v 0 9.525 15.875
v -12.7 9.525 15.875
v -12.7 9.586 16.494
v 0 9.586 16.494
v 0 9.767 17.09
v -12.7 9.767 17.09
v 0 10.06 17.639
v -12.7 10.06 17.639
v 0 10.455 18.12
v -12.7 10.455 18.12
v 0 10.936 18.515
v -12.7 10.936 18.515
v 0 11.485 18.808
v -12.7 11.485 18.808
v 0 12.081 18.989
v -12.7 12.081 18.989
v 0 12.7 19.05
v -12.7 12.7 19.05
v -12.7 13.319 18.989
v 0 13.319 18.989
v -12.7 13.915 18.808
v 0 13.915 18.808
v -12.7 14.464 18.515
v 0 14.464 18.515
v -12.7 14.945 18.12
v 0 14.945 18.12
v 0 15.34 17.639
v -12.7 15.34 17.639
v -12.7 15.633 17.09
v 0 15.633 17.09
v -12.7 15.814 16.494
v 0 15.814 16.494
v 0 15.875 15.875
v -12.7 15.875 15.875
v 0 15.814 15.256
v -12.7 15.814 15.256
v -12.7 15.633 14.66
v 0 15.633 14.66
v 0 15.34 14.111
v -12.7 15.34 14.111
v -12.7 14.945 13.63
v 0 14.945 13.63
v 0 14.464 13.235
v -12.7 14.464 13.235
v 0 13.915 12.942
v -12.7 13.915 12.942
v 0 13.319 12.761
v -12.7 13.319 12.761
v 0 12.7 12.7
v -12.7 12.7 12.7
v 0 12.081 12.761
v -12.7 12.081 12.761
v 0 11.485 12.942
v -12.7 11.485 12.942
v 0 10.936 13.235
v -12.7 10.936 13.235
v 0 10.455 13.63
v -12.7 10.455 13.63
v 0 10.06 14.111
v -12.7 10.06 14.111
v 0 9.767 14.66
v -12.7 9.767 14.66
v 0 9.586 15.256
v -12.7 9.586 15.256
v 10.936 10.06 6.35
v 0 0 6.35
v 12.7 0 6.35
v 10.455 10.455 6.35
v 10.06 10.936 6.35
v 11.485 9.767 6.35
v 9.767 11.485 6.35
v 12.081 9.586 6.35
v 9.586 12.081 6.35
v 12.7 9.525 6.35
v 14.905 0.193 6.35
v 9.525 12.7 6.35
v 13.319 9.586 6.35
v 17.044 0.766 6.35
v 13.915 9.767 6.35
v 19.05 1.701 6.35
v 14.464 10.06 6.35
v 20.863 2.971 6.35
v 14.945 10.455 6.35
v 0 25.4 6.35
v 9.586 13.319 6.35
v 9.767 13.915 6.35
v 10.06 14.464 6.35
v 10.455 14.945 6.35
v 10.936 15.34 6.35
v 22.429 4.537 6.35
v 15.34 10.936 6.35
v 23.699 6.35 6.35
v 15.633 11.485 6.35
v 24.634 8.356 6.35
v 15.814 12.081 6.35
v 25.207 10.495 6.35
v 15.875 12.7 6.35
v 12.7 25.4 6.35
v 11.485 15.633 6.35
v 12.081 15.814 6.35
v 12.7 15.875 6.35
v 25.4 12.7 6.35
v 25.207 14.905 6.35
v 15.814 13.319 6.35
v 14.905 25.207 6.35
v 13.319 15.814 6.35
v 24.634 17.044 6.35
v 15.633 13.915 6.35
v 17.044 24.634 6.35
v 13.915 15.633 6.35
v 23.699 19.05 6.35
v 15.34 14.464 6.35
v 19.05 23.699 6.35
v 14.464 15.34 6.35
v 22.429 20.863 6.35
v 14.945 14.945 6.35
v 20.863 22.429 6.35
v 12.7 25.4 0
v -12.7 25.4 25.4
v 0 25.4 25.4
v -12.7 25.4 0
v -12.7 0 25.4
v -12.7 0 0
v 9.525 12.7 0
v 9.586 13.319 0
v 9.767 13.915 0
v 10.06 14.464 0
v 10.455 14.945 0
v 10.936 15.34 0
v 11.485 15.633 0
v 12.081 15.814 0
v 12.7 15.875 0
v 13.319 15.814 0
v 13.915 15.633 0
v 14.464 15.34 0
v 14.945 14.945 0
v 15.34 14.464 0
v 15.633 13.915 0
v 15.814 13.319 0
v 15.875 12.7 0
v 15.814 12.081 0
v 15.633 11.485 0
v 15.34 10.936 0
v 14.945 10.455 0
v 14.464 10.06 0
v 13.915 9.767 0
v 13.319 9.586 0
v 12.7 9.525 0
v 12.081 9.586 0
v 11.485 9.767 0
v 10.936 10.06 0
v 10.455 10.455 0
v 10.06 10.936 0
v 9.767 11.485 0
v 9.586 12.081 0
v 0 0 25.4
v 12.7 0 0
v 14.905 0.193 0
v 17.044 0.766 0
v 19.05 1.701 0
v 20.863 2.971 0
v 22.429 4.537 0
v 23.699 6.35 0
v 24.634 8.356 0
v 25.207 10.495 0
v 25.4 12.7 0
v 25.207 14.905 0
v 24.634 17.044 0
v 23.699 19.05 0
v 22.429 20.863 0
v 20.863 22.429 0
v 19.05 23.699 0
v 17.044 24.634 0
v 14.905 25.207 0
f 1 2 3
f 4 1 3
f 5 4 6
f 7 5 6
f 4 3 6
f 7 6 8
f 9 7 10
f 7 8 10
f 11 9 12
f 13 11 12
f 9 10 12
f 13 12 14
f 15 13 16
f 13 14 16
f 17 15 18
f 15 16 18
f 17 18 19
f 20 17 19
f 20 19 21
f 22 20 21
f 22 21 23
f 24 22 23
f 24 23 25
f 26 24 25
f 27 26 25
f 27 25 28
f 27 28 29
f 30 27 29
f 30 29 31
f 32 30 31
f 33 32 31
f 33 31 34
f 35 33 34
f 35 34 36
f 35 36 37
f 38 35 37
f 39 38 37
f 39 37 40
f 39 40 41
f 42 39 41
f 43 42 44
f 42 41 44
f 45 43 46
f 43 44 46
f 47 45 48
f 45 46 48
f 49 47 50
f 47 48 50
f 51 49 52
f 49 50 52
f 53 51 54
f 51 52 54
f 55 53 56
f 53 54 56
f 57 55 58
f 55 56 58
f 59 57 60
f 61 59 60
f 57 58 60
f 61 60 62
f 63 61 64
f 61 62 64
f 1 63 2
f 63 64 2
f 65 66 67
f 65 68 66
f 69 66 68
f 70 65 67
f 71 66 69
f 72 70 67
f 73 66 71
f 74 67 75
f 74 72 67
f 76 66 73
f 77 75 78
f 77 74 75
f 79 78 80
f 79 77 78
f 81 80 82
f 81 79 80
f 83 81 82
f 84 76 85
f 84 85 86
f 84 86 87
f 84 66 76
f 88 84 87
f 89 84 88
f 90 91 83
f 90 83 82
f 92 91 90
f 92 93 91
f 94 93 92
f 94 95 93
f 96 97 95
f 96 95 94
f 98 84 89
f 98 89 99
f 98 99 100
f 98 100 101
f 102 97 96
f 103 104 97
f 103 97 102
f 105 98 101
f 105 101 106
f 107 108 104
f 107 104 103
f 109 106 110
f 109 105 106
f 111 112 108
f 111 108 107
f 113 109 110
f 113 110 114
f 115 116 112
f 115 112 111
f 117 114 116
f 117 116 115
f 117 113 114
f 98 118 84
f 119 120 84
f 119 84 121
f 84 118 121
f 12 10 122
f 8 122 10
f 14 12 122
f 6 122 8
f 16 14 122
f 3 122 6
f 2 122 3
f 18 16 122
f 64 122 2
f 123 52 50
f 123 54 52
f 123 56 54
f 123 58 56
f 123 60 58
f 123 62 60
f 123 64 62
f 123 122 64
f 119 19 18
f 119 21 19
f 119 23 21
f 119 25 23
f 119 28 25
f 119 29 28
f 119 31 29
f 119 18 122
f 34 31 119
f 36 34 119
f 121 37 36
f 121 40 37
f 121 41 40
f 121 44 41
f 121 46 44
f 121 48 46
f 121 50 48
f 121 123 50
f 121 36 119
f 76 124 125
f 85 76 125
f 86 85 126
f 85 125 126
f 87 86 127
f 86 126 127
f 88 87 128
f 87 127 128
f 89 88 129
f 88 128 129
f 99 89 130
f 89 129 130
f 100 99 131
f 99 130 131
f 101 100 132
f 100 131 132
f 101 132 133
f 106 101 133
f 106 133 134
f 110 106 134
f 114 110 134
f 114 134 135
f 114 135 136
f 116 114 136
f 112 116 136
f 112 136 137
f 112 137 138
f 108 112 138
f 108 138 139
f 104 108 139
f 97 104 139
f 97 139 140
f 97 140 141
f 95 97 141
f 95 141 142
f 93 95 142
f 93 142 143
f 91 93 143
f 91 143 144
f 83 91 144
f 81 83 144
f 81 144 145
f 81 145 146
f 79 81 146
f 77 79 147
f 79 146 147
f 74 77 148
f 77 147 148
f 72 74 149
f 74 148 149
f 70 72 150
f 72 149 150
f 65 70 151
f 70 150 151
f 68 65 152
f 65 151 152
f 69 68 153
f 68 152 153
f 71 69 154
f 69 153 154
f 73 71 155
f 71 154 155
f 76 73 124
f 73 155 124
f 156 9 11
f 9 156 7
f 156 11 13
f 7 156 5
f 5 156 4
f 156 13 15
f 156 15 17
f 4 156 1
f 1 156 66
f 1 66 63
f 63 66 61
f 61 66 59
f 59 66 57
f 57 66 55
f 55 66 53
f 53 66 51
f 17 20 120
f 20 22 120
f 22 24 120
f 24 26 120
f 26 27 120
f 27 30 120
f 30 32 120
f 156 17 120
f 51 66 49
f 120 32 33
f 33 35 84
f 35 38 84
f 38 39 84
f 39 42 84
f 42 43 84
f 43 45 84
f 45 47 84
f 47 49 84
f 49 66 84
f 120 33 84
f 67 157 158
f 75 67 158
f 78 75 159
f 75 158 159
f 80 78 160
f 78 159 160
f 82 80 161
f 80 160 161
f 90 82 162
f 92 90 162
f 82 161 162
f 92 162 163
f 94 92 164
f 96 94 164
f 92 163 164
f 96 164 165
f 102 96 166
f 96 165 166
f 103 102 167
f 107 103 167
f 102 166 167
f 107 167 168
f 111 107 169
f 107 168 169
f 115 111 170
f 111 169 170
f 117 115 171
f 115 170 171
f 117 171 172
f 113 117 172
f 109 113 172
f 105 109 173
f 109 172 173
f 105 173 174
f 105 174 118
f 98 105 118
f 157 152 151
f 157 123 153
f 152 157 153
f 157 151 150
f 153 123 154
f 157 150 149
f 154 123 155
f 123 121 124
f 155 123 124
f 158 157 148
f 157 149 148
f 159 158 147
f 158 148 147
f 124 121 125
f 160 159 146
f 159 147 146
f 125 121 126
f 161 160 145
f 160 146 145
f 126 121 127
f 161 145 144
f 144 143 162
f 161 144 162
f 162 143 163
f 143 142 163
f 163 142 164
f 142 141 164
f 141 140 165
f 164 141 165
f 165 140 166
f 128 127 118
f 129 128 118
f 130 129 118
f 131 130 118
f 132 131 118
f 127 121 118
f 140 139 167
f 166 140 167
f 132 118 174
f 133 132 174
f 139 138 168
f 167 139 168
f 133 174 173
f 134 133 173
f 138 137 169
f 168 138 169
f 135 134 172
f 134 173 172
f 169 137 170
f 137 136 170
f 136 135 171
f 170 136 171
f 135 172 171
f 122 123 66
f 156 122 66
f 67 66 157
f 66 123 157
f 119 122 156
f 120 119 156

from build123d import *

# Parameters (mm, degrees)
F0_W     = 12.7
F0_H     = 25.4
F1_DEPTH = 25.4
F3_DEPTH = 6.35
F5_D     = 6.35
F7_D     = 6.35


with BuildPart() as f1:
    # F0 (on Top) → F1 (new body)
    with BuildSketch(Plane.XY):
        with Locations((-6.35, 12.7)):
            Rectangle(F0_W, F0_H)
    extrude(amount=F1_DEPTH)

    # F2 (on Top) → F3 (join)
    with BuildSketch(Plane.XY):
        with BuildLine():
            Line((0, 25.4), (0, 0))
            Line((0, 0), (12.7, 0))
            ThreePointArc((12.7, 0), (25.4, 12.7), (12.7, 25.4))
            Line((12.7, 25.4), (0, 25.4))
        make_face()
    extrude(amount=F3_DEPTH)

    # F5 (through all)
    with Locations(Plane.YZ):
        with Locations((12.7, 15.875)):
            Hole(F5_D / 2)

    # F7 (through all)
    with Locations(Plane.XY.offset(6.35)):
        with Locations((12.7, 12.7)):
            Hole(F7_D / 2)


solid = f1.part
